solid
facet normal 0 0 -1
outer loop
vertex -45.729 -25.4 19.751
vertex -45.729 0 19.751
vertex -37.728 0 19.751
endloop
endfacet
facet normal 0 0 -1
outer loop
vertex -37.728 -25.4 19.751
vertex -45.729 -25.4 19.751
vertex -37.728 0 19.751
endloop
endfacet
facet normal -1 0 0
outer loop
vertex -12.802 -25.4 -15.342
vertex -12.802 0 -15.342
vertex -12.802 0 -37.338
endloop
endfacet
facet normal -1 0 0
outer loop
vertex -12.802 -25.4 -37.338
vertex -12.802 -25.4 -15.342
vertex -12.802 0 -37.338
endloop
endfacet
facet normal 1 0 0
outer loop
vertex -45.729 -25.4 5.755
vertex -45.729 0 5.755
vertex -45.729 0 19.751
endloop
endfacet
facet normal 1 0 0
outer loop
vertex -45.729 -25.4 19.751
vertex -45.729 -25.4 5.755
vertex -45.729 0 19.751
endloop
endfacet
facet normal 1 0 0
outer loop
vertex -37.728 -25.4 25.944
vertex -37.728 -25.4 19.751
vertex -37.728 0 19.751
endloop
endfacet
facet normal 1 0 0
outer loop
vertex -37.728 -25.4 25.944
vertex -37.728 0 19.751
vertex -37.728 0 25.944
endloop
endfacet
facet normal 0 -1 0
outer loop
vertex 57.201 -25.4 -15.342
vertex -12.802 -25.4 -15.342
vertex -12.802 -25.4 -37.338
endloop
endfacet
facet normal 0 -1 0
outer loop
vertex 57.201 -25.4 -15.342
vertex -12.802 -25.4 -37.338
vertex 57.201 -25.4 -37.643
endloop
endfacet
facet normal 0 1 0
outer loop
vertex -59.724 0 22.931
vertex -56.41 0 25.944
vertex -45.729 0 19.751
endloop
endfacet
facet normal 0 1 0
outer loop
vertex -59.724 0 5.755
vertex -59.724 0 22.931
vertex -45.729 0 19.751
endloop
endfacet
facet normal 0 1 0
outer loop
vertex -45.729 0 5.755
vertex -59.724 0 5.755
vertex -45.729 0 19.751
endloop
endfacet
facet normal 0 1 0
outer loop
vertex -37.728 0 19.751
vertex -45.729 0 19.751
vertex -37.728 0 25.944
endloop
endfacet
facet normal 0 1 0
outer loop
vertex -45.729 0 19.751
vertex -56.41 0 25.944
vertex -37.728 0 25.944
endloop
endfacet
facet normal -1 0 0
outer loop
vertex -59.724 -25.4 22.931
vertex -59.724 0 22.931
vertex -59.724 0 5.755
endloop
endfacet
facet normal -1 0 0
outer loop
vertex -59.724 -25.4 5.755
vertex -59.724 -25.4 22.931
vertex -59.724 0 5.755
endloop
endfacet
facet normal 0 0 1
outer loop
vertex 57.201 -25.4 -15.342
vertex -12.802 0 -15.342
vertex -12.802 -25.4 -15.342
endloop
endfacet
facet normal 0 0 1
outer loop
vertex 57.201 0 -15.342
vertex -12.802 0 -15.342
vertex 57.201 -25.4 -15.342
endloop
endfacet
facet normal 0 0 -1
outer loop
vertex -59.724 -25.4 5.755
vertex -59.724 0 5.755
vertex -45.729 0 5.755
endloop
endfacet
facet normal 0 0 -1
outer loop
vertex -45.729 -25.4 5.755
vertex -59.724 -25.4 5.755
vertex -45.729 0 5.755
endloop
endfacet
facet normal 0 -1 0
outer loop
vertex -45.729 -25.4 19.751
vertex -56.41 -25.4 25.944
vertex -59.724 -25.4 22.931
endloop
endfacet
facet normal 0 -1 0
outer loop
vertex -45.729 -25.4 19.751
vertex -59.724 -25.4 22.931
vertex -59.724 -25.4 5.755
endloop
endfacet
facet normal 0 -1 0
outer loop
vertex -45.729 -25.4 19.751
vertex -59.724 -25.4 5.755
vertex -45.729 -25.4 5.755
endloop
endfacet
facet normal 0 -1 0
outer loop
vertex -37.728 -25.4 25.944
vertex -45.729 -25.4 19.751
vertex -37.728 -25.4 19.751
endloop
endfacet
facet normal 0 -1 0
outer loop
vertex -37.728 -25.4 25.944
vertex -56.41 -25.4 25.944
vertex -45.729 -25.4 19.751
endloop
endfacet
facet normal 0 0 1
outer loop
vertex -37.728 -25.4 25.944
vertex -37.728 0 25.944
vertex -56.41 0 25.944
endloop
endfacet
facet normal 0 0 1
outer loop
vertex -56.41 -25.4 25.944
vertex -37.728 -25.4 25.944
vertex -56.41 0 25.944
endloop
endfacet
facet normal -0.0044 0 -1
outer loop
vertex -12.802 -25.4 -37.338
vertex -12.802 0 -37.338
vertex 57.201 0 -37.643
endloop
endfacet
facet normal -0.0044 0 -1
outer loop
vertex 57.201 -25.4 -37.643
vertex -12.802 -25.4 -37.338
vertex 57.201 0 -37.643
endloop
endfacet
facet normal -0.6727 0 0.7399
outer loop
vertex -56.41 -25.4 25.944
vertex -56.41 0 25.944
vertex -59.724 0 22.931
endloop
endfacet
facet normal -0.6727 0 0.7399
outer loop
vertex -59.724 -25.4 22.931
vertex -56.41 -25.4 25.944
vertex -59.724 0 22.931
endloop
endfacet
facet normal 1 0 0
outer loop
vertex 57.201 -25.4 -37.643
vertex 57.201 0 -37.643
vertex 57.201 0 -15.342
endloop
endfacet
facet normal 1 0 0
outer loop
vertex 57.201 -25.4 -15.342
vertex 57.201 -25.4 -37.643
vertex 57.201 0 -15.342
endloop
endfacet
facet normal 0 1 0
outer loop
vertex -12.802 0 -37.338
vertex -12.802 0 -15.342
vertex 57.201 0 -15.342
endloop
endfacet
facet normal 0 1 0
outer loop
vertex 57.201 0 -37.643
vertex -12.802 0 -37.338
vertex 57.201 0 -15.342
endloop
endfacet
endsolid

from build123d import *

# Parameters (mm, degrees)
F0_W     = 70.0024
F0_H     = 8.001
F1_DEPTH = 25.4


with BuildPart() as f1:
    # F0 (on Front) → F1 (new body)
    with BuildSketch(Plane.XZ):
        Polygon((-56.409574, 25.943839), (-59.724098, 22.930635), (-59.724098, 5.755361), (-45.728698, 5.755361), (-45.728698, 19.750761), (-37.727698, 19.750761), (-37.727698, 25.943839), align=None)
        with Locations((22.1996, -19.3421)):
            Rectangle(F0_W, F0_H)
        Polygon((57.2008, -23.3426), (-12.8016, -23.3426), (-12.8016, -37.338), (57.2008, -37.642799), align=None)
    extrude(amount=F1_DEPTH)


solid = f1.part
